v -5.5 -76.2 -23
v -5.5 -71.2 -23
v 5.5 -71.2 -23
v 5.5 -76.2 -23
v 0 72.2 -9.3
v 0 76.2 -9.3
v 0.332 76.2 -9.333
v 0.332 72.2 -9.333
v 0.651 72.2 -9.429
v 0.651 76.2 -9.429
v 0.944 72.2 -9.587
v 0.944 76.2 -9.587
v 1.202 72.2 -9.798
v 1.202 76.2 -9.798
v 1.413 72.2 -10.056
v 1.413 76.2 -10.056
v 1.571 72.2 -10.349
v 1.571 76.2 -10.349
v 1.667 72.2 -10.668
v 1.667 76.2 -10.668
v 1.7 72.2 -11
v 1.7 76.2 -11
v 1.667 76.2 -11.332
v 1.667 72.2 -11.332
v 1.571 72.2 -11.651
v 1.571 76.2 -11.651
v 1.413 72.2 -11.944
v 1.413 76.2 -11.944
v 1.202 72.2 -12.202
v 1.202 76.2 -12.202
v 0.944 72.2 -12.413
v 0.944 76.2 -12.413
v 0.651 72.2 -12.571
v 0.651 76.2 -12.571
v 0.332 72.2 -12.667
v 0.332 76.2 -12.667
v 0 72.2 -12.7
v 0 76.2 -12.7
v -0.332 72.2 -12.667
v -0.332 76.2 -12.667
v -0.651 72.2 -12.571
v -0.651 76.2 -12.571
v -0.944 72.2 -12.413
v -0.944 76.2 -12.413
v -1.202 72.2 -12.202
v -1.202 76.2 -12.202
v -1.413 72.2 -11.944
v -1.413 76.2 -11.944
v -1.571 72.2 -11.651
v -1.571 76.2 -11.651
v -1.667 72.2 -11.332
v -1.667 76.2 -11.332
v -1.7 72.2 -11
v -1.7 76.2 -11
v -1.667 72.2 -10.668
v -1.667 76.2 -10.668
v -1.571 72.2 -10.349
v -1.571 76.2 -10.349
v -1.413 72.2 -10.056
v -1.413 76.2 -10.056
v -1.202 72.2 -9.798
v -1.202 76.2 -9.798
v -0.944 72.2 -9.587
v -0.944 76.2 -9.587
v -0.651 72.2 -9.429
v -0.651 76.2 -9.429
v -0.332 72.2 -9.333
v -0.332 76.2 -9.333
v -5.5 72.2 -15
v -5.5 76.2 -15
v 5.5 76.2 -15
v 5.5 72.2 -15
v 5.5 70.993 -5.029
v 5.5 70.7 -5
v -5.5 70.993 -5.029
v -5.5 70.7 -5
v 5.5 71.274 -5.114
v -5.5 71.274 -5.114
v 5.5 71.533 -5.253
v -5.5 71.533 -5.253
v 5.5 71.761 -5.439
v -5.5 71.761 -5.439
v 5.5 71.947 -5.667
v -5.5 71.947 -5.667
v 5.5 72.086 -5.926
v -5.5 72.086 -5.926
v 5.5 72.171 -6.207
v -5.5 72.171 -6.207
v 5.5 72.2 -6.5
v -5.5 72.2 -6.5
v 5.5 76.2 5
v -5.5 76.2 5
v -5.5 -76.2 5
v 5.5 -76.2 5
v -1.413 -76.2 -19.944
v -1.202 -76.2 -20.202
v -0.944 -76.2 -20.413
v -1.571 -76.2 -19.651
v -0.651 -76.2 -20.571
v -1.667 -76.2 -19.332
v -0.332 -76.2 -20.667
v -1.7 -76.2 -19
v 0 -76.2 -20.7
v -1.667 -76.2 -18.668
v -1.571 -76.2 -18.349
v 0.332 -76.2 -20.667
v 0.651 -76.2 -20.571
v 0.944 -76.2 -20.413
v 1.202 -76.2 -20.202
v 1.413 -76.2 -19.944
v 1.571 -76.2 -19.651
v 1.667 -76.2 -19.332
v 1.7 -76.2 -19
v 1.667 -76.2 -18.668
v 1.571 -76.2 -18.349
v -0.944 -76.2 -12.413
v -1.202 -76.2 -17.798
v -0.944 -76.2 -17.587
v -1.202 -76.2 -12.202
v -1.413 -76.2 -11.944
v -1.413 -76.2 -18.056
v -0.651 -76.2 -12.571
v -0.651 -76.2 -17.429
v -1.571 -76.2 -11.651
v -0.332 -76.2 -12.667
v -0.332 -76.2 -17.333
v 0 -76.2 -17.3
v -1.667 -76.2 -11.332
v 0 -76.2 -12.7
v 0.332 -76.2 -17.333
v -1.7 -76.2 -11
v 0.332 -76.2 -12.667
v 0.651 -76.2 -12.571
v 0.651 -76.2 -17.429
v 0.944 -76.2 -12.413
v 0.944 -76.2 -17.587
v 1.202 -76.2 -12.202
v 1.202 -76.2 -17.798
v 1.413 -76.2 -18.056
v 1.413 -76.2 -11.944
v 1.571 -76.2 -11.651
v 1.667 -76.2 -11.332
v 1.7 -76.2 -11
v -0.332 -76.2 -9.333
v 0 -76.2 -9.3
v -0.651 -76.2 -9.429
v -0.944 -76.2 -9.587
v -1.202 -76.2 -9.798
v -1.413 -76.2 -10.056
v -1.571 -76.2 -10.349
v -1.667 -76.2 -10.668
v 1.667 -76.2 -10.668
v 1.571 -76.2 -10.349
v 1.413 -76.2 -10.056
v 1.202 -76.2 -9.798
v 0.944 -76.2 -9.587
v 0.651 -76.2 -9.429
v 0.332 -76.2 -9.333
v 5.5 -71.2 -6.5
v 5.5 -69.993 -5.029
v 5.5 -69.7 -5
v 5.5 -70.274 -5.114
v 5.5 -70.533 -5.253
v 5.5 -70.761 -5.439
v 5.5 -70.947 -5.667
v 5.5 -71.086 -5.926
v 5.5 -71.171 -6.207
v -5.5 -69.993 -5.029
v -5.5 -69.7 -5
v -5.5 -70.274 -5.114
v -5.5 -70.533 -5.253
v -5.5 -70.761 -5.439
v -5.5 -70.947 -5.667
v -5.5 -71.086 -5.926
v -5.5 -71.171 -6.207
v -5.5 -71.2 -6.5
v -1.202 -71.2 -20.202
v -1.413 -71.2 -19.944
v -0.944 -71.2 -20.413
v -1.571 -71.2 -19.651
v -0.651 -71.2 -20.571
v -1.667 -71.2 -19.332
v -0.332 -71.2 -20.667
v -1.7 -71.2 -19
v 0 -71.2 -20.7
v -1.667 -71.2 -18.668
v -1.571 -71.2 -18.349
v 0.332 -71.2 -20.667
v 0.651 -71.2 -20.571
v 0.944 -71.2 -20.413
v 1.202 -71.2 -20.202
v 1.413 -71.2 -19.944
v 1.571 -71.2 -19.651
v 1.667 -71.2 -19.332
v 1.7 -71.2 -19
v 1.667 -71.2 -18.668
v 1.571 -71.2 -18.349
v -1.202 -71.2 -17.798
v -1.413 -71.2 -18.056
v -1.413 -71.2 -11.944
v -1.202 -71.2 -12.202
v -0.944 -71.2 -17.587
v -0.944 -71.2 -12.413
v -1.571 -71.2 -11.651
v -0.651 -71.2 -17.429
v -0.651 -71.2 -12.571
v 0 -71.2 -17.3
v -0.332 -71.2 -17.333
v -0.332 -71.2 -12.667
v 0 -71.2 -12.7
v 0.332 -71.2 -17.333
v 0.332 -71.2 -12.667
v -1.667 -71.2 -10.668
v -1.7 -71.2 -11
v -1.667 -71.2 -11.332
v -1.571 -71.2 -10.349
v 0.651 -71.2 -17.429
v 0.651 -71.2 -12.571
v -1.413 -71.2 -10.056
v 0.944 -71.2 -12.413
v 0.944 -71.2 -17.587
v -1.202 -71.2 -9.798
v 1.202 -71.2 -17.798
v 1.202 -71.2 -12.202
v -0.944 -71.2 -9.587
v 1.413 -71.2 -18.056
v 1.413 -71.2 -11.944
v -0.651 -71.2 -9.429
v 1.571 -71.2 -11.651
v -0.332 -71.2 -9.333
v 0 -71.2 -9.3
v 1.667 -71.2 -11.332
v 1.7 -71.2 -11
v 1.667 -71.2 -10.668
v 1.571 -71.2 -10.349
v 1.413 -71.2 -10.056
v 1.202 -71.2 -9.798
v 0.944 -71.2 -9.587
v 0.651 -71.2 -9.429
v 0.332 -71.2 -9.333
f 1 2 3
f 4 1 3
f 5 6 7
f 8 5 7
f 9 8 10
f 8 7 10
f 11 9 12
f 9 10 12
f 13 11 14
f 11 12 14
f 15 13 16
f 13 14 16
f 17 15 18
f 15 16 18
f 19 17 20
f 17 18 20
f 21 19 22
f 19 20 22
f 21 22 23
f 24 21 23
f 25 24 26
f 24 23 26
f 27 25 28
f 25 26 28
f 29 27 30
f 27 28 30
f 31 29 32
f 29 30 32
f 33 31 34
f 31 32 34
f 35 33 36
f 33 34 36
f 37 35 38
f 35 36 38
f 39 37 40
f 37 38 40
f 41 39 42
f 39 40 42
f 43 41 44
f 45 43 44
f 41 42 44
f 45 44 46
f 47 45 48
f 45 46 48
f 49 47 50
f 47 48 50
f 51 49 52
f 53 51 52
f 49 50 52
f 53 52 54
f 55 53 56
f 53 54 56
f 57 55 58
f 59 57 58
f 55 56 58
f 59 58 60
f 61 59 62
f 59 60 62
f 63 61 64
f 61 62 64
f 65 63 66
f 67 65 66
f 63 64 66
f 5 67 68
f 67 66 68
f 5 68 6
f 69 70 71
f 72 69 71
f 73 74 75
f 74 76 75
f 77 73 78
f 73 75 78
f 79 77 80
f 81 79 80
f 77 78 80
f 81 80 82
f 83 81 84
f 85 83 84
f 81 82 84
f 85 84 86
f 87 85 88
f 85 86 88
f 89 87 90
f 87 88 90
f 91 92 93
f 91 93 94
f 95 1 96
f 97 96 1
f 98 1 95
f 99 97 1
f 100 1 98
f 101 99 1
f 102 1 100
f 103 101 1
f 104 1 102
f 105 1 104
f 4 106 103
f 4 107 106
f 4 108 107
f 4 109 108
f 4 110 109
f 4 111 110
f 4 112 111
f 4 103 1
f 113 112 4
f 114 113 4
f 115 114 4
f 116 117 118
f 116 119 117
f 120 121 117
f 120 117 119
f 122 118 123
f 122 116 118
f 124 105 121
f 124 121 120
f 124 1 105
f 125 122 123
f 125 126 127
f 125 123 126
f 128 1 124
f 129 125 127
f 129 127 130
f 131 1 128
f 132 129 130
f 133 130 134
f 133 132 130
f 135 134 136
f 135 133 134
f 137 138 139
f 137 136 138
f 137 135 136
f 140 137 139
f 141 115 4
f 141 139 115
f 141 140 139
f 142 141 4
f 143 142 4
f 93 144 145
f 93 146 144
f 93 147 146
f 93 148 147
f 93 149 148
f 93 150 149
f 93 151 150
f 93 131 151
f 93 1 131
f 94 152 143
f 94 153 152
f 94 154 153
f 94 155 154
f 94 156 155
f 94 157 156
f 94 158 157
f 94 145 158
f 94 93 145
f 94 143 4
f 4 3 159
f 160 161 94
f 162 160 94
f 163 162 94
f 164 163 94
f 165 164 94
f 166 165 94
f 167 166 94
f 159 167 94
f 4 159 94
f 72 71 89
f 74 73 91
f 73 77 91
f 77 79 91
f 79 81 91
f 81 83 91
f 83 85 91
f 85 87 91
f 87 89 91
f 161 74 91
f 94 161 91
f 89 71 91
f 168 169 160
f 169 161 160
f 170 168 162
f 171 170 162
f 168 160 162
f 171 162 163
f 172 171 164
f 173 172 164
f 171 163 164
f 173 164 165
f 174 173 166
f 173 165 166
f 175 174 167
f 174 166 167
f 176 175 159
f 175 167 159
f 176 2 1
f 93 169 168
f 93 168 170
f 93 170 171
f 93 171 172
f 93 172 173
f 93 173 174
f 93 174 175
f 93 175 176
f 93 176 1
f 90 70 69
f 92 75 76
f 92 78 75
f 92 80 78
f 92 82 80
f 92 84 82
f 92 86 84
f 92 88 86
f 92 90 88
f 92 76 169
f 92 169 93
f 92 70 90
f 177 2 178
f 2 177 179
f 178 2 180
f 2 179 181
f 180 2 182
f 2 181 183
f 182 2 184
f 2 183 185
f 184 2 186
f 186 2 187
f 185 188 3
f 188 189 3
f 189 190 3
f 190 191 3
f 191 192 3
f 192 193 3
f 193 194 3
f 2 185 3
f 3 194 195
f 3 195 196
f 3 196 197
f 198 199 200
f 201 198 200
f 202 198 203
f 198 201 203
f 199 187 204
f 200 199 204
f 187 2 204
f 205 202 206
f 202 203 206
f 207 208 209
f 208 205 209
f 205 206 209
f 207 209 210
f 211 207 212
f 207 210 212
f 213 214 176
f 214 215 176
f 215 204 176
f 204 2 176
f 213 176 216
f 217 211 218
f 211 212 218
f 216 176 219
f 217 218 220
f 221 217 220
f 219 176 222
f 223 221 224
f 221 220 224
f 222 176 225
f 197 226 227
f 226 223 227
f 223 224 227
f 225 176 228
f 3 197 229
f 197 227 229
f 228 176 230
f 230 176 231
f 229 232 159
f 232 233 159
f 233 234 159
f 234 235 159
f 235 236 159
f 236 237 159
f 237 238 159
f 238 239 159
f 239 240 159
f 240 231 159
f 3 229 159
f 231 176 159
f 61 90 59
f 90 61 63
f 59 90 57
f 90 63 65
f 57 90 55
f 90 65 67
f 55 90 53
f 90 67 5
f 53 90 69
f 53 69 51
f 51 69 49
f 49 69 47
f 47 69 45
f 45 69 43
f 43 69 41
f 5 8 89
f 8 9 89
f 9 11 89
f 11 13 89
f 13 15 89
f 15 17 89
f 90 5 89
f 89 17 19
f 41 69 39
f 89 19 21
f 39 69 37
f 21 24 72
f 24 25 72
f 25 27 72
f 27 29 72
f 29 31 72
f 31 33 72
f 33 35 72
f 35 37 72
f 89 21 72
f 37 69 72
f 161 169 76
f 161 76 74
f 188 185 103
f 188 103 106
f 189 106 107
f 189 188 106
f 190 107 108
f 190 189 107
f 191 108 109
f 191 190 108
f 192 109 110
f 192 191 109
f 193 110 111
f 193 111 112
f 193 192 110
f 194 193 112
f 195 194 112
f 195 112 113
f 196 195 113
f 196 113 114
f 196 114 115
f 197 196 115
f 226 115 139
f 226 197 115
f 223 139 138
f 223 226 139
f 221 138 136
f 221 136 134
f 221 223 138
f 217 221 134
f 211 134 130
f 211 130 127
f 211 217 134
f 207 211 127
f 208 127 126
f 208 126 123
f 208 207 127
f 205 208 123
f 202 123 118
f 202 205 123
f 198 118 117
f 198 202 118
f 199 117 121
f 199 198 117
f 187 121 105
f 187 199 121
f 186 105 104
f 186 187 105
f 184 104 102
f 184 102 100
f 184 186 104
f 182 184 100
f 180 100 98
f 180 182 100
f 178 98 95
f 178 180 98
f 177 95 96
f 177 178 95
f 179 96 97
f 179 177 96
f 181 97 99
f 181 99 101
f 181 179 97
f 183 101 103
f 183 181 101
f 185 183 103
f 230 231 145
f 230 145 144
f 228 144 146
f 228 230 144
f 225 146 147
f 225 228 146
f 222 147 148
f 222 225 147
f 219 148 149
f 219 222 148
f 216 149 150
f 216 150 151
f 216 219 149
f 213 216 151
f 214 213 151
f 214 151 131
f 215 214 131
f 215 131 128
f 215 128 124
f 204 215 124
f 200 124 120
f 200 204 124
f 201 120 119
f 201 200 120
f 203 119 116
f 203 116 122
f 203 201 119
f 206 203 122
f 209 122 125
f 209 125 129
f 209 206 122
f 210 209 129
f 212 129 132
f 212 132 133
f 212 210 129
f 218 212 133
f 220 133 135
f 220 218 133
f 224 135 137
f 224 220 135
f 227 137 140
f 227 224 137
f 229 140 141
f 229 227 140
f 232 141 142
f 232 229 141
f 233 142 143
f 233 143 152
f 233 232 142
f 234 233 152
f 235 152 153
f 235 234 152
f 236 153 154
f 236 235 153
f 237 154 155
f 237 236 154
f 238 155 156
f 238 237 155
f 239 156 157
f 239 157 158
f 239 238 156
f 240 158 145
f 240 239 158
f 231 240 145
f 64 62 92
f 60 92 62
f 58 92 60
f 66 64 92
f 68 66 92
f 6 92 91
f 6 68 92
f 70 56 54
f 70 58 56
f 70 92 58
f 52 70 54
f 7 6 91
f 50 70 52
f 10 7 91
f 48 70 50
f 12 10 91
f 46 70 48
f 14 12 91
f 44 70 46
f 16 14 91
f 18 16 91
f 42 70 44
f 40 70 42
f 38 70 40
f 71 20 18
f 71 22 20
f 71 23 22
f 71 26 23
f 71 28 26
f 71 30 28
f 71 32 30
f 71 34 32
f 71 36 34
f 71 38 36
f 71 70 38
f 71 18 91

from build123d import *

# Parameters (mm, degrees)
SKETCH1_W           = 11
SKETCH1_H           = 10
BOSS_EXTRUDE1_DEPTH = 76.2
SKETCH3_W           = 11
SKETCH3_H           = 20
SKETCH3_R           = 1.7
BOSS_EXTRUDE3_DEPTH = 4
BOSS_EXTRUDE4_START = -5
SKETCH4_W           = 11
SKETCH4_H           = 28
SKETCH4_R           = 1.7
BOSS_EXTRUDE4_DEPTH = 5
FILLET1_R           = 1.5


with BuildPart() as part:
    # Sketch1 → Boss-Extrude1 (new, symmetric)
    with BuildSketch(Plane(origin=(0, 0, 0), x_dir=(1, 0, 0), z_dir=(0, 1, 0))):
        Rectangle(SKETCH1_W, SKETCH1_H)
    extrude(amount=BOSS_EXTRUDE1_DEPTH, both=True)

    # Sketch3 → Boss-Extrude3 (add)
    with BuildSketch(Plane(origin=(0, 76.2, 0), x_dir=(1, 0, 0), z_dir=(0, 1, 0))):
        with Locations((0, 5)):
            Rectangle(SKETCH3_W, SKETCH3_H)
        with Locations(Location((0, 11, 0), (0, 0, 270))):
            Circle(SKETCH3_R, mode=Mode.SUBTRACT)
    extrude(amount=-BOSS_EXTRUDE3_DEPTH)

    # Sketch4 → Boss-Extrude4 (add)
    with BuildSketch(Plane.XZ.offset(76.2).offset(BOSS_EXTRUDE4_START)):
        with Locations((0, -9)):
            Rectangle(SKETCH4_W, SKETCH4_H)
        with Locations(Location((0, -11, 0), (0, 0, 90))):
            Circle(SKETCH4_R, mode=Mode.SUBTRACT)
        with Locations(Location((0, -19, 0), (0, 0, 270))):
            Circle(SKETCH4_R, mode=Mode.SUBTRACT)
    extrude(amount=BOSS_EXTRUDE4_DEPTH)

    # Fillet1
    fillet1_edges = [part.edges().sort_by_distance(p)[0] for p in [
        (0, 72.2, -5),
        (0, -71.2, -5),
    ]]
    fillet(fillet1_edges, radius=FILLET1_R)


solid = part.part
